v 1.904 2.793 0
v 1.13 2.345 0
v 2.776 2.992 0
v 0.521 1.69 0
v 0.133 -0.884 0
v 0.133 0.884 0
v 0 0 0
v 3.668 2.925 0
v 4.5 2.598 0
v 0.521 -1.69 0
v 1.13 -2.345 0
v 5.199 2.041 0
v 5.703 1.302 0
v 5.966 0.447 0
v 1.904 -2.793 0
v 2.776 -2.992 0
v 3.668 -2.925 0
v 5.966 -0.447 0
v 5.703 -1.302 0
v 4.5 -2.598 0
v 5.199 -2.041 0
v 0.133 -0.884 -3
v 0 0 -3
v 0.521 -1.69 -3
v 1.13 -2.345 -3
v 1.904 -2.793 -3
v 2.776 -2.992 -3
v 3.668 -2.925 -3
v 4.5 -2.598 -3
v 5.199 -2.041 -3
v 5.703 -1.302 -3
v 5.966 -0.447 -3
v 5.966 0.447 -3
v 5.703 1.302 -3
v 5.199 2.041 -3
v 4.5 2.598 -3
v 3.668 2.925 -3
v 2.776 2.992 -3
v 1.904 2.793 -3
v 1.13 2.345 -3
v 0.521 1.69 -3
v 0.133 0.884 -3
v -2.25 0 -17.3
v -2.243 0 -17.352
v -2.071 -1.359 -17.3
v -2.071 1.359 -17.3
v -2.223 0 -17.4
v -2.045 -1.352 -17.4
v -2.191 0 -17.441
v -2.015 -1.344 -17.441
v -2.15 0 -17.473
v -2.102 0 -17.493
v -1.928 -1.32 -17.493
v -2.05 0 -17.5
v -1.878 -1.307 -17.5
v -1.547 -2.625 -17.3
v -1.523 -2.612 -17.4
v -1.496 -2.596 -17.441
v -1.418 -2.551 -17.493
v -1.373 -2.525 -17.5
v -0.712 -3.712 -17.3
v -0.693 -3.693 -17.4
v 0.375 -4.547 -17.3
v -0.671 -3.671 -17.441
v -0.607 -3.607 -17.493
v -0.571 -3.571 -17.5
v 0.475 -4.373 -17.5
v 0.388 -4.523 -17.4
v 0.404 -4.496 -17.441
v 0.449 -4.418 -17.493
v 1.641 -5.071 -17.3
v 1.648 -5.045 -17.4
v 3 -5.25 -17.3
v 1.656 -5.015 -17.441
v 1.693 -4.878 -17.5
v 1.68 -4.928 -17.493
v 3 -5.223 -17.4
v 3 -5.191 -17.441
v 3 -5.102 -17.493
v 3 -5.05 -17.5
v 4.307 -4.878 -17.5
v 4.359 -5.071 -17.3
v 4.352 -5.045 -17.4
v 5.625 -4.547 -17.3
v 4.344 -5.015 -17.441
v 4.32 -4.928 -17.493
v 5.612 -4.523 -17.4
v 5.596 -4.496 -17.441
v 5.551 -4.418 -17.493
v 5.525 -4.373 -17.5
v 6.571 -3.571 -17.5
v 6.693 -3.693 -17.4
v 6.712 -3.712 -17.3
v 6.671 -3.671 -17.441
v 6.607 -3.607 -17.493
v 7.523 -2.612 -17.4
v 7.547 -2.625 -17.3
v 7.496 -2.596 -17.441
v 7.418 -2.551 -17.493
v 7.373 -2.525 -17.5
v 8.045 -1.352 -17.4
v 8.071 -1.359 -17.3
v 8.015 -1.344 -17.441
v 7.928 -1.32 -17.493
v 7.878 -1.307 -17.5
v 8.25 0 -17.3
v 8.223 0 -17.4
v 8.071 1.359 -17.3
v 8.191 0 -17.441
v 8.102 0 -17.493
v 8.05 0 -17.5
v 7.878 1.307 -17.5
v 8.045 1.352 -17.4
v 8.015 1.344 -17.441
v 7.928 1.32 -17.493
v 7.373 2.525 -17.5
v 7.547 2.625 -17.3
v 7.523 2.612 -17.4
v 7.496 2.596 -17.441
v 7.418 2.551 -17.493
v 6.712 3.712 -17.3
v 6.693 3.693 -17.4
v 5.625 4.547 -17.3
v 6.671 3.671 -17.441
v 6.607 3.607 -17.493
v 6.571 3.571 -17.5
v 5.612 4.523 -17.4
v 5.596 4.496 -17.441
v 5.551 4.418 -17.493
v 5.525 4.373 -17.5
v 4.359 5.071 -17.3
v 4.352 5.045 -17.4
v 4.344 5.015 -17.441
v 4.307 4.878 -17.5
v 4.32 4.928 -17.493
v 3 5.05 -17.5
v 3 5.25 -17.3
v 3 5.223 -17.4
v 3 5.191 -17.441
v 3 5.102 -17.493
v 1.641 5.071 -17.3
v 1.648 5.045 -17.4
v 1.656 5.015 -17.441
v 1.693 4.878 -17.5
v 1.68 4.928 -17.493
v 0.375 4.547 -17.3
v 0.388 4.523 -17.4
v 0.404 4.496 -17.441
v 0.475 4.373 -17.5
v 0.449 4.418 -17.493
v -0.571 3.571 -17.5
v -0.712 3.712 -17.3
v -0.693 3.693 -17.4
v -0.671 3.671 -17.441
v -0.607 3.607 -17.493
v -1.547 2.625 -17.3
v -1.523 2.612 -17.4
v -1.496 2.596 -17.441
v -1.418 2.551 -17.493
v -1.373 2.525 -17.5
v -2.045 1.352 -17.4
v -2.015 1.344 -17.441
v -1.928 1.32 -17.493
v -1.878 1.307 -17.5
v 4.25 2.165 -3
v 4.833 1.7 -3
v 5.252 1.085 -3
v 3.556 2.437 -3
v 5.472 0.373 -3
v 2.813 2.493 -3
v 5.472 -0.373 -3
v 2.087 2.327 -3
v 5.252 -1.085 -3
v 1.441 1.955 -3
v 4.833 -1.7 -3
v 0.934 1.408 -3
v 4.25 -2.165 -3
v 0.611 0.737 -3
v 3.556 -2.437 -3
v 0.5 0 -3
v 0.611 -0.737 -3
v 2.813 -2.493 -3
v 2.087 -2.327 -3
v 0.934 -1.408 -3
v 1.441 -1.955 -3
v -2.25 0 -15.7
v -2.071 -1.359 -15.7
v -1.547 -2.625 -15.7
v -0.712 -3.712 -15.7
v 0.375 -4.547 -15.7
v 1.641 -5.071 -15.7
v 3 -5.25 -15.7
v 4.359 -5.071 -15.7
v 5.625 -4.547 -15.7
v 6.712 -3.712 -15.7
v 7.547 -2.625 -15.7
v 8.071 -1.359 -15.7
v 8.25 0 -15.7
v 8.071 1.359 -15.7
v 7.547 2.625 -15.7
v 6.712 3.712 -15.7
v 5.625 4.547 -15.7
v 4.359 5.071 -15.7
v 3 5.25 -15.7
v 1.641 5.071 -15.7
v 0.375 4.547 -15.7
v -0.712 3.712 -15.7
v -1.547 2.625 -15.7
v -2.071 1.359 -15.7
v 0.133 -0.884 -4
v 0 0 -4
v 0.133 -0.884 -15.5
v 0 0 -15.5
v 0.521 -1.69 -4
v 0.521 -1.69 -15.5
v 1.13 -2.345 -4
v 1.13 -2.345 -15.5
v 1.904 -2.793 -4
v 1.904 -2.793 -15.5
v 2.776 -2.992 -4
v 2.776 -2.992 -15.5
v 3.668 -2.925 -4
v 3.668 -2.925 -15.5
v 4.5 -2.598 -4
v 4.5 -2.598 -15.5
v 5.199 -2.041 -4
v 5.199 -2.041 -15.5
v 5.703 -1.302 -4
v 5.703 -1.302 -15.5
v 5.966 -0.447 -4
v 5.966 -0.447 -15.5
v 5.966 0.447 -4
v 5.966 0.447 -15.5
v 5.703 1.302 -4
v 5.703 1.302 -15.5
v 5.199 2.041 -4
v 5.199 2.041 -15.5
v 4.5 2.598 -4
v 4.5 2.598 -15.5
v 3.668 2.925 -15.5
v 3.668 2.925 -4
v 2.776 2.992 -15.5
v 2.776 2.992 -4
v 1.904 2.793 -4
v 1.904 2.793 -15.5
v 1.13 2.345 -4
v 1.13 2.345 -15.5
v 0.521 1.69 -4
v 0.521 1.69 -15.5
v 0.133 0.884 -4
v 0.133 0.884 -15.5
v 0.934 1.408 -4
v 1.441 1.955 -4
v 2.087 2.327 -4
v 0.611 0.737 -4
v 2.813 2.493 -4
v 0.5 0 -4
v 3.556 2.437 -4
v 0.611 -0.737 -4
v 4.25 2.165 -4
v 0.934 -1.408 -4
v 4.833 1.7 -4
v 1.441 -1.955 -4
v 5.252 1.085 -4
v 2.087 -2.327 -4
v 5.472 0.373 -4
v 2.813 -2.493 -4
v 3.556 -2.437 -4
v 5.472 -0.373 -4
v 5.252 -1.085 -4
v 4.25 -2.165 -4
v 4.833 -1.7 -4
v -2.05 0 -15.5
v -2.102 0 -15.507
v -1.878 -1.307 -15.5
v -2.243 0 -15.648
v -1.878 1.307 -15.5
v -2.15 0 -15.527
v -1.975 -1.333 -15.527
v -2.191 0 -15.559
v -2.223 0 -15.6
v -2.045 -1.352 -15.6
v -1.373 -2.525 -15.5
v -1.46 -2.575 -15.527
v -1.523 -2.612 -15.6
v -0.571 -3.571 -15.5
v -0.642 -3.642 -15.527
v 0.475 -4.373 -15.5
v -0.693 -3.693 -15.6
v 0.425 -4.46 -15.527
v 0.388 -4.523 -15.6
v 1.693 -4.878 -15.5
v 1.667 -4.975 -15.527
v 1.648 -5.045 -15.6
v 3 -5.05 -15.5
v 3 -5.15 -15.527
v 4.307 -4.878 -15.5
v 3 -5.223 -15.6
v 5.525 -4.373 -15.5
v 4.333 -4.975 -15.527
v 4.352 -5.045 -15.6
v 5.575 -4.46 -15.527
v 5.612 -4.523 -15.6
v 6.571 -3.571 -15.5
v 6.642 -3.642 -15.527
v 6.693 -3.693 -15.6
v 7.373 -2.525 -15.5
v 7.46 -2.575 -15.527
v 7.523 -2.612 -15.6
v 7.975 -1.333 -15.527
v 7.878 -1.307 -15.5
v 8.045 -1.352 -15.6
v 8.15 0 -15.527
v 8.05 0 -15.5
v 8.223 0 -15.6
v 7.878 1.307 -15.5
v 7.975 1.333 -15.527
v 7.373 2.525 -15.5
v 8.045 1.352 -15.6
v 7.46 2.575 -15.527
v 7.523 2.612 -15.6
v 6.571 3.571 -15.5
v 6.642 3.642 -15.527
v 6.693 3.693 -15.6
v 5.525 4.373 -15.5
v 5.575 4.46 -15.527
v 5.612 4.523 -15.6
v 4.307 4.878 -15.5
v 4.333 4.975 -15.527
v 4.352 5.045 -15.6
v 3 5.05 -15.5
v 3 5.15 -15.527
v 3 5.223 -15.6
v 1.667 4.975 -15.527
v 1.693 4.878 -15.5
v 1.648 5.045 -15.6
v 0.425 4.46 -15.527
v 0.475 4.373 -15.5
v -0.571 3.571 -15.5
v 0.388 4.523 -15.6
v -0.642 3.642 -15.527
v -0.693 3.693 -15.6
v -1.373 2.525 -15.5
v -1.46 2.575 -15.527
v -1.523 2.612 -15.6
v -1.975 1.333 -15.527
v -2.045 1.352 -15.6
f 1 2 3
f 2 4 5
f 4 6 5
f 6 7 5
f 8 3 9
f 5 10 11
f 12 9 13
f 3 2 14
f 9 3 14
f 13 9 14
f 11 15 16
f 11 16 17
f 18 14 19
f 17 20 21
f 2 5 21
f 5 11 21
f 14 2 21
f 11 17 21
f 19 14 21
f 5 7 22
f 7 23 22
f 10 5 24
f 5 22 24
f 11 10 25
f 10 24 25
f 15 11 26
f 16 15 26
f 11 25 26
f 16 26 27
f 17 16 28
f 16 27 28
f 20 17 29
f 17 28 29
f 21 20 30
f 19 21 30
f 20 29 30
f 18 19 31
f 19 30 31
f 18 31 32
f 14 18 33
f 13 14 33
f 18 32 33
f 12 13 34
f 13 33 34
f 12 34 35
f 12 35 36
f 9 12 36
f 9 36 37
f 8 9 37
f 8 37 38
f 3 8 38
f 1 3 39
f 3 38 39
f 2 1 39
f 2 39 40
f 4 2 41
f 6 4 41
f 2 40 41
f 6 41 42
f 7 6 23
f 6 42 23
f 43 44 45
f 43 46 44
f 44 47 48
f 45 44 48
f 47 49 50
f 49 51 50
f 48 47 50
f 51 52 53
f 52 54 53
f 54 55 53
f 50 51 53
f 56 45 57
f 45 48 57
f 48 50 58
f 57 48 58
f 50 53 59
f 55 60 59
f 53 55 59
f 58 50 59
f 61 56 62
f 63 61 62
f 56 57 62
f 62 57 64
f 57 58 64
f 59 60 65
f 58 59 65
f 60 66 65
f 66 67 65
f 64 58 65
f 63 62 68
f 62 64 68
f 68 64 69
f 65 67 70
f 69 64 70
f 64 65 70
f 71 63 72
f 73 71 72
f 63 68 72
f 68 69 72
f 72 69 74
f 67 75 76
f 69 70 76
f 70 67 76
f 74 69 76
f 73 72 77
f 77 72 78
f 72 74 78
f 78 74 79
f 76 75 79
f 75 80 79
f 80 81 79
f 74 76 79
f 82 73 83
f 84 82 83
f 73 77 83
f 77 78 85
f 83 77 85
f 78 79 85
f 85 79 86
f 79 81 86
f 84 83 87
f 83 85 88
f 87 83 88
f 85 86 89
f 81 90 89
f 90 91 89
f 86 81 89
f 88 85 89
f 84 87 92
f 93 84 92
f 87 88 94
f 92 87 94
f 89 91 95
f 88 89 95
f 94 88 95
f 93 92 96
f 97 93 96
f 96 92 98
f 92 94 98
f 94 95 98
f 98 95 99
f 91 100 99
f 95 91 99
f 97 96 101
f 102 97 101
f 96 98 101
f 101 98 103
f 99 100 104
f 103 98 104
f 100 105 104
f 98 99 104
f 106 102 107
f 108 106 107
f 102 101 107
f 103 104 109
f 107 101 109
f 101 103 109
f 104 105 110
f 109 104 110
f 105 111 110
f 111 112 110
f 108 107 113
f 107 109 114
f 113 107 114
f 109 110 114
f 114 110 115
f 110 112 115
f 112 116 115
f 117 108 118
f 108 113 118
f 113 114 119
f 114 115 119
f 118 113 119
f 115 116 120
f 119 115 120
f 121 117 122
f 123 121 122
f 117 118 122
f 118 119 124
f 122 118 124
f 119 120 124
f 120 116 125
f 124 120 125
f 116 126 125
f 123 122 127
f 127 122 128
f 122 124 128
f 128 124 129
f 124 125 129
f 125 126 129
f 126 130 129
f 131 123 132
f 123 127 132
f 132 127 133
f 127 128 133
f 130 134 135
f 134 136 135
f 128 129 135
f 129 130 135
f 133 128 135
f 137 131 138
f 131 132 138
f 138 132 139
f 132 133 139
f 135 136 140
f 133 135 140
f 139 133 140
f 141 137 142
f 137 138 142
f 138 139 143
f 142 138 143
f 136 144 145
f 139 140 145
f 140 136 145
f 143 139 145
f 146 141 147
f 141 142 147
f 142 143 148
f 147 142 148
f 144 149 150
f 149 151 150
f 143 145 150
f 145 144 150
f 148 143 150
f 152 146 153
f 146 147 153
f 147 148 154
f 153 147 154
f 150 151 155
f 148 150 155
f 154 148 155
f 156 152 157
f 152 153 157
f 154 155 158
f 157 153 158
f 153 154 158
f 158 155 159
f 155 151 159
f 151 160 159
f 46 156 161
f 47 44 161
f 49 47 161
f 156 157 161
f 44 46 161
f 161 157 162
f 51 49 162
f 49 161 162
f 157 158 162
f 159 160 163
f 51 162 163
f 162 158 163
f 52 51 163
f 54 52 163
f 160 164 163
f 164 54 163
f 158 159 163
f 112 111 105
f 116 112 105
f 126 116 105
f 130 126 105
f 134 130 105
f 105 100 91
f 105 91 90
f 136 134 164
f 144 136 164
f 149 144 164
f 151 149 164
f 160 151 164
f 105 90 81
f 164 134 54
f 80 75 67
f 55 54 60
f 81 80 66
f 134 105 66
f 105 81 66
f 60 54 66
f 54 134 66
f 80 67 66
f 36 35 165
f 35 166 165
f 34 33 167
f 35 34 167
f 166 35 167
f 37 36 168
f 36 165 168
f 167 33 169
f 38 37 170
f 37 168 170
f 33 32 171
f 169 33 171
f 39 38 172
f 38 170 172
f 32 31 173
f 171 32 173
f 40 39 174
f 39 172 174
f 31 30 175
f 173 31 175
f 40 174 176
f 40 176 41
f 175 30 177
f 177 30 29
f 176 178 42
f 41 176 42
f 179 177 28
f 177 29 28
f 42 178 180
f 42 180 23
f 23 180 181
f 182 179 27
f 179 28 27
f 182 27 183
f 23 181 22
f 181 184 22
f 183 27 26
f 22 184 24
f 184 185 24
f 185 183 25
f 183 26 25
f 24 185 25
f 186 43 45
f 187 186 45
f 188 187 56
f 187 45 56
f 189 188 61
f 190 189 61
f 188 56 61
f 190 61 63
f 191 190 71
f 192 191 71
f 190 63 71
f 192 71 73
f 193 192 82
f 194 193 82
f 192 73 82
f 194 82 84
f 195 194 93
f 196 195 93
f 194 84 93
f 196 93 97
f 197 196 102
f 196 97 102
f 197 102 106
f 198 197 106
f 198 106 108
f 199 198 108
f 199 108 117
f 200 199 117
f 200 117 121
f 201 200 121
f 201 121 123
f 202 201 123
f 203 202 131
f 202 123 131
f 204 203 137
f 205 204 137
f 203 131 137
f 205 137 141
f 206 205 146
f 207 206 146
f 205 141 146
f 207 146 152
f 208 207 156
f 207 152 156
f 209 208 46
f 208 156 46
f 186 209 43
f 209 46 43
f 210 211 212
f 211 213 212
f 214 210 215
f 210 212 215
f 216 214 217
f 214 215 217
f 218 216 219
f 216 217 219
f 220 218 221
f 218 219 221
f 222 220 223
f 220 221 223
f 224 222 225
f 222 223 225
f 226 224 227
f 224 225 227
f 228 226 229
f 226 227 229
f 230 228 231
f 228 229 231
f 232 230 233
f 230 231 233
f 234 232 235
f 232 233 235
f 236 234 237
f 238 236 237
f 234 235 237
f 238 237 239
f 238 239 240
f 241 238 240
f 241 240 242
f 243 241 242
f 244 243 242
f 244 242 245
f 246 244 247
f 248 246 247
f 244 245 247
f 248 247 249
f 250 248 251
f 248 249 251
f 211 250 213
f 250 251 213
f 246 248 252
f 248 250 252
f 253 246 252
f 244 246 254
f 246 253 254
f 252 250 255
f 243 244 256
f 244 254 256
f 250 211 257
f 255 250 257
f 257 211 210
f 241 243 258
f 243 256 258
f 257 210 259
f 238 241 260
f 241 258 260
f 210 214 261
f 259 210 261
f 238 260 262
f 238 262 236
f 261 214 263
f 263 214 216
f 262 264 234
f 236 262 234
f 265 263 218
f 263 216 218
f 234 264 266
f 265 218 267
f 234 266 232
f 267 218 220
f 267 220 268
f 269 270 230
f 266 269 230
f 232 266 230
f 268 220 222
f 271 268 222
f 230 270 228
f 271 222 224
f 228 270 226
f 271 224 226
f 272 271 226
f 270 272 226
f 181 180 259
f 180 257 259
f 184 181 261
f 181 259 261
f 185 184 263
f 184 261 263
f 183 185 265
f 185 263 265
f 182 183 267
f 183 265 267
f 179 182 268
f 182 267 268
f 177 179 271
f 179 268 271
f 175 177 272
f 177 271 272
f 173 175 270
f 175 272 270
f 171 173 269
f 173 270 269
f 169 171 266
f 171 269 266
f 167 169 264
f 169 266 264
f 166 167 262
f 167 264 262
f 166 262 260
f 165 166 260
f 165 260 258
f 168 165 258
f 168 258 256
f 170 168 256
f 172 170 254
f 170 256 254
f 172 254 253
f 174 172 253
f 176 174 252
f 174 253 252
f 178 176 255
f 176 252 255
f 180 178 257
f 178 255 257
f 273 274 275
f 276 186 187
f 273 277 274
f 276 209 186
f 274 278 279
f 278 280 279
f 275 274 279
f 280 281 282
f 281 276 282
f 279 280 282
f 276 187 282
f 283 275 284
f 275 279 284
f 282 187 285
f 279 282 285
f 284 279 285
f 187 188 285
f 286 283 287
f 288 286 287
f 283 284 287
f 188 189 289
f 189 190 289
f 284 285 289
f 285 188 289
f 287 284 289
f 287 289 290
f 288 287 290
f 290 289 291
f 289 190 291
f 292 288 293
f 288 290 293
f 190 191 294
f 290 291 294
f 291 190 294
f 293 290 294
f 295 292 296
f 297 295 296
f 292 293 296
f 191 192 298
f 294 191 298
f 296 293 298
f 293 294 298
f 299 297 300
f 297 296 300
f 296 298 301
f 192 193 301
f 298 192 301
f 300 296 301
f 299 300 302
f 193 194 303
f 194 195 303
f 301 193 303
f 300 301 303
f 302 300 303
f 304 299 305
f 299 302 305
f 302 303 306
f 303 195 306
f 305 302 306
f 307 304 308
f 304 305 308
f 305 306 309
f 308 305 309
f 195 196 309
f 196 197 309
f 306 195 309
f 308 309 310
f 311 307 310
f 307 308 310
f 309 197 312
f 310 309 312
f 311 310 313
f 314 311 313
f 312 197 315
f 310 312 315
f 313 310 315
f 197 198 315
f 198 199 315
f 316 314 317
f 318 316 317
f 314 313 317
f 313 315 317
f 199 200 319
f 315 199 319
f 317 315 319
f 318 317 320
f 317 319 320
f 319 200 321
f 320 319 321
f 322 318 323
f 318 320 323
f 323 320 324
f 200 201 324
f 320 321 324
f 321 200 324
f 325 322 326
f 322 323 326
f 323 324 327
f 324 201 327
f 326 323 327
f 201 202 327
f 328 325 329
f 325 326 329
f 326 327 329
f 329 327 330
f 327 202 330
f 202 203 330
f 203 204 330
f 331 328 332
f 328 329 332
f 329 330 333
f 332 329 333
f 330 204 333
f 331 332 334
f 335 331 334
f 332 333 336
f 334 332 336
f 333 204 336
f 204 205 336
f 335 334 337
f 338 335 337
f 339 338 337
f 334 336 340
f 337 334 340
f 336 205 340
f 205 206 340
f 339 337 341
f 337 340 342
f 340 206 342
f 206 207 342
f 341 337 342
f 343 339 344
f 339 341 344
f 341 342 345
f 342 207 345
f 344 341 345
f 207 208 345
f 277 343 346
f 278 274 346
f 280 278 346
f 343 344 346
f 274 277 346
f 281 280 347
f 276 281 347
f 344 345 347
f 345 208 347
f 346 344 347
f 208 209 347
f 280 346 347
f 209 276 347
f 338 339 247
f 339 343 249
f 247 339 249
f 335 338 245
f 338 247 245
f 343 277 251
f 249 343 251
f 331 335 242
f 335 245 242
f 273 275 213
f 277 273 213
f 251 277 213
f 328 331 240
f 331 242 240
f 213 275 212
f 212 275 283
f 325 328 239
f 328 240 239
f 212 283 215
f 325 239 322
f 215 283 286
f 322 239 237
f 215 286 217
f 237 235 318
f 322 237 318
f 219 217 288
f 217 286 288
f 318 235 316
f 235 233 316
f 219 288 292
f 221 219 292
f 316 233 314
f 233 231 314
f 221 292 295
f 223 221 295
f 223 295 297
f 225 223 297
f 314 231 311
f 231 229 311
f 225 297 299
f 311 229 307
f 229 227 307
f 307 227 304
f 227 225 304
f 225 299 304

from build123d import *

# Parameters (mm, degrees)
REDONDEO1_R = 0.2


with BuildPart() as part:
    # Croquis2 → Revolución1 (revolve)
    with BuildSketch(Plane(origin=(0, 0, 0), x_dir=(1, 0, 0), z_dir=(0, 1, 0))):
        Polygon((0, 0), (0, 3), (0.5, 3), (0.5, 4), (0, 4), (0, 15.5), (-2.25, 15.5), (-2.25, 17.5), (3, 17.5), (3, 0), align=None)
    revolve(axis=Axis((3, 0, -17.5), (0, 0, 1)))

    # Redondeo1
    redondeo1_edges = [part.edges().sort_by_distance(p)[0] for p in [
        (8.25, 0, -17.5),
        (8.25, 0, -15.5),
    ]]
    fillet(redondeo1_edges, radius=REDONDEO1_R)


solid = part.part
